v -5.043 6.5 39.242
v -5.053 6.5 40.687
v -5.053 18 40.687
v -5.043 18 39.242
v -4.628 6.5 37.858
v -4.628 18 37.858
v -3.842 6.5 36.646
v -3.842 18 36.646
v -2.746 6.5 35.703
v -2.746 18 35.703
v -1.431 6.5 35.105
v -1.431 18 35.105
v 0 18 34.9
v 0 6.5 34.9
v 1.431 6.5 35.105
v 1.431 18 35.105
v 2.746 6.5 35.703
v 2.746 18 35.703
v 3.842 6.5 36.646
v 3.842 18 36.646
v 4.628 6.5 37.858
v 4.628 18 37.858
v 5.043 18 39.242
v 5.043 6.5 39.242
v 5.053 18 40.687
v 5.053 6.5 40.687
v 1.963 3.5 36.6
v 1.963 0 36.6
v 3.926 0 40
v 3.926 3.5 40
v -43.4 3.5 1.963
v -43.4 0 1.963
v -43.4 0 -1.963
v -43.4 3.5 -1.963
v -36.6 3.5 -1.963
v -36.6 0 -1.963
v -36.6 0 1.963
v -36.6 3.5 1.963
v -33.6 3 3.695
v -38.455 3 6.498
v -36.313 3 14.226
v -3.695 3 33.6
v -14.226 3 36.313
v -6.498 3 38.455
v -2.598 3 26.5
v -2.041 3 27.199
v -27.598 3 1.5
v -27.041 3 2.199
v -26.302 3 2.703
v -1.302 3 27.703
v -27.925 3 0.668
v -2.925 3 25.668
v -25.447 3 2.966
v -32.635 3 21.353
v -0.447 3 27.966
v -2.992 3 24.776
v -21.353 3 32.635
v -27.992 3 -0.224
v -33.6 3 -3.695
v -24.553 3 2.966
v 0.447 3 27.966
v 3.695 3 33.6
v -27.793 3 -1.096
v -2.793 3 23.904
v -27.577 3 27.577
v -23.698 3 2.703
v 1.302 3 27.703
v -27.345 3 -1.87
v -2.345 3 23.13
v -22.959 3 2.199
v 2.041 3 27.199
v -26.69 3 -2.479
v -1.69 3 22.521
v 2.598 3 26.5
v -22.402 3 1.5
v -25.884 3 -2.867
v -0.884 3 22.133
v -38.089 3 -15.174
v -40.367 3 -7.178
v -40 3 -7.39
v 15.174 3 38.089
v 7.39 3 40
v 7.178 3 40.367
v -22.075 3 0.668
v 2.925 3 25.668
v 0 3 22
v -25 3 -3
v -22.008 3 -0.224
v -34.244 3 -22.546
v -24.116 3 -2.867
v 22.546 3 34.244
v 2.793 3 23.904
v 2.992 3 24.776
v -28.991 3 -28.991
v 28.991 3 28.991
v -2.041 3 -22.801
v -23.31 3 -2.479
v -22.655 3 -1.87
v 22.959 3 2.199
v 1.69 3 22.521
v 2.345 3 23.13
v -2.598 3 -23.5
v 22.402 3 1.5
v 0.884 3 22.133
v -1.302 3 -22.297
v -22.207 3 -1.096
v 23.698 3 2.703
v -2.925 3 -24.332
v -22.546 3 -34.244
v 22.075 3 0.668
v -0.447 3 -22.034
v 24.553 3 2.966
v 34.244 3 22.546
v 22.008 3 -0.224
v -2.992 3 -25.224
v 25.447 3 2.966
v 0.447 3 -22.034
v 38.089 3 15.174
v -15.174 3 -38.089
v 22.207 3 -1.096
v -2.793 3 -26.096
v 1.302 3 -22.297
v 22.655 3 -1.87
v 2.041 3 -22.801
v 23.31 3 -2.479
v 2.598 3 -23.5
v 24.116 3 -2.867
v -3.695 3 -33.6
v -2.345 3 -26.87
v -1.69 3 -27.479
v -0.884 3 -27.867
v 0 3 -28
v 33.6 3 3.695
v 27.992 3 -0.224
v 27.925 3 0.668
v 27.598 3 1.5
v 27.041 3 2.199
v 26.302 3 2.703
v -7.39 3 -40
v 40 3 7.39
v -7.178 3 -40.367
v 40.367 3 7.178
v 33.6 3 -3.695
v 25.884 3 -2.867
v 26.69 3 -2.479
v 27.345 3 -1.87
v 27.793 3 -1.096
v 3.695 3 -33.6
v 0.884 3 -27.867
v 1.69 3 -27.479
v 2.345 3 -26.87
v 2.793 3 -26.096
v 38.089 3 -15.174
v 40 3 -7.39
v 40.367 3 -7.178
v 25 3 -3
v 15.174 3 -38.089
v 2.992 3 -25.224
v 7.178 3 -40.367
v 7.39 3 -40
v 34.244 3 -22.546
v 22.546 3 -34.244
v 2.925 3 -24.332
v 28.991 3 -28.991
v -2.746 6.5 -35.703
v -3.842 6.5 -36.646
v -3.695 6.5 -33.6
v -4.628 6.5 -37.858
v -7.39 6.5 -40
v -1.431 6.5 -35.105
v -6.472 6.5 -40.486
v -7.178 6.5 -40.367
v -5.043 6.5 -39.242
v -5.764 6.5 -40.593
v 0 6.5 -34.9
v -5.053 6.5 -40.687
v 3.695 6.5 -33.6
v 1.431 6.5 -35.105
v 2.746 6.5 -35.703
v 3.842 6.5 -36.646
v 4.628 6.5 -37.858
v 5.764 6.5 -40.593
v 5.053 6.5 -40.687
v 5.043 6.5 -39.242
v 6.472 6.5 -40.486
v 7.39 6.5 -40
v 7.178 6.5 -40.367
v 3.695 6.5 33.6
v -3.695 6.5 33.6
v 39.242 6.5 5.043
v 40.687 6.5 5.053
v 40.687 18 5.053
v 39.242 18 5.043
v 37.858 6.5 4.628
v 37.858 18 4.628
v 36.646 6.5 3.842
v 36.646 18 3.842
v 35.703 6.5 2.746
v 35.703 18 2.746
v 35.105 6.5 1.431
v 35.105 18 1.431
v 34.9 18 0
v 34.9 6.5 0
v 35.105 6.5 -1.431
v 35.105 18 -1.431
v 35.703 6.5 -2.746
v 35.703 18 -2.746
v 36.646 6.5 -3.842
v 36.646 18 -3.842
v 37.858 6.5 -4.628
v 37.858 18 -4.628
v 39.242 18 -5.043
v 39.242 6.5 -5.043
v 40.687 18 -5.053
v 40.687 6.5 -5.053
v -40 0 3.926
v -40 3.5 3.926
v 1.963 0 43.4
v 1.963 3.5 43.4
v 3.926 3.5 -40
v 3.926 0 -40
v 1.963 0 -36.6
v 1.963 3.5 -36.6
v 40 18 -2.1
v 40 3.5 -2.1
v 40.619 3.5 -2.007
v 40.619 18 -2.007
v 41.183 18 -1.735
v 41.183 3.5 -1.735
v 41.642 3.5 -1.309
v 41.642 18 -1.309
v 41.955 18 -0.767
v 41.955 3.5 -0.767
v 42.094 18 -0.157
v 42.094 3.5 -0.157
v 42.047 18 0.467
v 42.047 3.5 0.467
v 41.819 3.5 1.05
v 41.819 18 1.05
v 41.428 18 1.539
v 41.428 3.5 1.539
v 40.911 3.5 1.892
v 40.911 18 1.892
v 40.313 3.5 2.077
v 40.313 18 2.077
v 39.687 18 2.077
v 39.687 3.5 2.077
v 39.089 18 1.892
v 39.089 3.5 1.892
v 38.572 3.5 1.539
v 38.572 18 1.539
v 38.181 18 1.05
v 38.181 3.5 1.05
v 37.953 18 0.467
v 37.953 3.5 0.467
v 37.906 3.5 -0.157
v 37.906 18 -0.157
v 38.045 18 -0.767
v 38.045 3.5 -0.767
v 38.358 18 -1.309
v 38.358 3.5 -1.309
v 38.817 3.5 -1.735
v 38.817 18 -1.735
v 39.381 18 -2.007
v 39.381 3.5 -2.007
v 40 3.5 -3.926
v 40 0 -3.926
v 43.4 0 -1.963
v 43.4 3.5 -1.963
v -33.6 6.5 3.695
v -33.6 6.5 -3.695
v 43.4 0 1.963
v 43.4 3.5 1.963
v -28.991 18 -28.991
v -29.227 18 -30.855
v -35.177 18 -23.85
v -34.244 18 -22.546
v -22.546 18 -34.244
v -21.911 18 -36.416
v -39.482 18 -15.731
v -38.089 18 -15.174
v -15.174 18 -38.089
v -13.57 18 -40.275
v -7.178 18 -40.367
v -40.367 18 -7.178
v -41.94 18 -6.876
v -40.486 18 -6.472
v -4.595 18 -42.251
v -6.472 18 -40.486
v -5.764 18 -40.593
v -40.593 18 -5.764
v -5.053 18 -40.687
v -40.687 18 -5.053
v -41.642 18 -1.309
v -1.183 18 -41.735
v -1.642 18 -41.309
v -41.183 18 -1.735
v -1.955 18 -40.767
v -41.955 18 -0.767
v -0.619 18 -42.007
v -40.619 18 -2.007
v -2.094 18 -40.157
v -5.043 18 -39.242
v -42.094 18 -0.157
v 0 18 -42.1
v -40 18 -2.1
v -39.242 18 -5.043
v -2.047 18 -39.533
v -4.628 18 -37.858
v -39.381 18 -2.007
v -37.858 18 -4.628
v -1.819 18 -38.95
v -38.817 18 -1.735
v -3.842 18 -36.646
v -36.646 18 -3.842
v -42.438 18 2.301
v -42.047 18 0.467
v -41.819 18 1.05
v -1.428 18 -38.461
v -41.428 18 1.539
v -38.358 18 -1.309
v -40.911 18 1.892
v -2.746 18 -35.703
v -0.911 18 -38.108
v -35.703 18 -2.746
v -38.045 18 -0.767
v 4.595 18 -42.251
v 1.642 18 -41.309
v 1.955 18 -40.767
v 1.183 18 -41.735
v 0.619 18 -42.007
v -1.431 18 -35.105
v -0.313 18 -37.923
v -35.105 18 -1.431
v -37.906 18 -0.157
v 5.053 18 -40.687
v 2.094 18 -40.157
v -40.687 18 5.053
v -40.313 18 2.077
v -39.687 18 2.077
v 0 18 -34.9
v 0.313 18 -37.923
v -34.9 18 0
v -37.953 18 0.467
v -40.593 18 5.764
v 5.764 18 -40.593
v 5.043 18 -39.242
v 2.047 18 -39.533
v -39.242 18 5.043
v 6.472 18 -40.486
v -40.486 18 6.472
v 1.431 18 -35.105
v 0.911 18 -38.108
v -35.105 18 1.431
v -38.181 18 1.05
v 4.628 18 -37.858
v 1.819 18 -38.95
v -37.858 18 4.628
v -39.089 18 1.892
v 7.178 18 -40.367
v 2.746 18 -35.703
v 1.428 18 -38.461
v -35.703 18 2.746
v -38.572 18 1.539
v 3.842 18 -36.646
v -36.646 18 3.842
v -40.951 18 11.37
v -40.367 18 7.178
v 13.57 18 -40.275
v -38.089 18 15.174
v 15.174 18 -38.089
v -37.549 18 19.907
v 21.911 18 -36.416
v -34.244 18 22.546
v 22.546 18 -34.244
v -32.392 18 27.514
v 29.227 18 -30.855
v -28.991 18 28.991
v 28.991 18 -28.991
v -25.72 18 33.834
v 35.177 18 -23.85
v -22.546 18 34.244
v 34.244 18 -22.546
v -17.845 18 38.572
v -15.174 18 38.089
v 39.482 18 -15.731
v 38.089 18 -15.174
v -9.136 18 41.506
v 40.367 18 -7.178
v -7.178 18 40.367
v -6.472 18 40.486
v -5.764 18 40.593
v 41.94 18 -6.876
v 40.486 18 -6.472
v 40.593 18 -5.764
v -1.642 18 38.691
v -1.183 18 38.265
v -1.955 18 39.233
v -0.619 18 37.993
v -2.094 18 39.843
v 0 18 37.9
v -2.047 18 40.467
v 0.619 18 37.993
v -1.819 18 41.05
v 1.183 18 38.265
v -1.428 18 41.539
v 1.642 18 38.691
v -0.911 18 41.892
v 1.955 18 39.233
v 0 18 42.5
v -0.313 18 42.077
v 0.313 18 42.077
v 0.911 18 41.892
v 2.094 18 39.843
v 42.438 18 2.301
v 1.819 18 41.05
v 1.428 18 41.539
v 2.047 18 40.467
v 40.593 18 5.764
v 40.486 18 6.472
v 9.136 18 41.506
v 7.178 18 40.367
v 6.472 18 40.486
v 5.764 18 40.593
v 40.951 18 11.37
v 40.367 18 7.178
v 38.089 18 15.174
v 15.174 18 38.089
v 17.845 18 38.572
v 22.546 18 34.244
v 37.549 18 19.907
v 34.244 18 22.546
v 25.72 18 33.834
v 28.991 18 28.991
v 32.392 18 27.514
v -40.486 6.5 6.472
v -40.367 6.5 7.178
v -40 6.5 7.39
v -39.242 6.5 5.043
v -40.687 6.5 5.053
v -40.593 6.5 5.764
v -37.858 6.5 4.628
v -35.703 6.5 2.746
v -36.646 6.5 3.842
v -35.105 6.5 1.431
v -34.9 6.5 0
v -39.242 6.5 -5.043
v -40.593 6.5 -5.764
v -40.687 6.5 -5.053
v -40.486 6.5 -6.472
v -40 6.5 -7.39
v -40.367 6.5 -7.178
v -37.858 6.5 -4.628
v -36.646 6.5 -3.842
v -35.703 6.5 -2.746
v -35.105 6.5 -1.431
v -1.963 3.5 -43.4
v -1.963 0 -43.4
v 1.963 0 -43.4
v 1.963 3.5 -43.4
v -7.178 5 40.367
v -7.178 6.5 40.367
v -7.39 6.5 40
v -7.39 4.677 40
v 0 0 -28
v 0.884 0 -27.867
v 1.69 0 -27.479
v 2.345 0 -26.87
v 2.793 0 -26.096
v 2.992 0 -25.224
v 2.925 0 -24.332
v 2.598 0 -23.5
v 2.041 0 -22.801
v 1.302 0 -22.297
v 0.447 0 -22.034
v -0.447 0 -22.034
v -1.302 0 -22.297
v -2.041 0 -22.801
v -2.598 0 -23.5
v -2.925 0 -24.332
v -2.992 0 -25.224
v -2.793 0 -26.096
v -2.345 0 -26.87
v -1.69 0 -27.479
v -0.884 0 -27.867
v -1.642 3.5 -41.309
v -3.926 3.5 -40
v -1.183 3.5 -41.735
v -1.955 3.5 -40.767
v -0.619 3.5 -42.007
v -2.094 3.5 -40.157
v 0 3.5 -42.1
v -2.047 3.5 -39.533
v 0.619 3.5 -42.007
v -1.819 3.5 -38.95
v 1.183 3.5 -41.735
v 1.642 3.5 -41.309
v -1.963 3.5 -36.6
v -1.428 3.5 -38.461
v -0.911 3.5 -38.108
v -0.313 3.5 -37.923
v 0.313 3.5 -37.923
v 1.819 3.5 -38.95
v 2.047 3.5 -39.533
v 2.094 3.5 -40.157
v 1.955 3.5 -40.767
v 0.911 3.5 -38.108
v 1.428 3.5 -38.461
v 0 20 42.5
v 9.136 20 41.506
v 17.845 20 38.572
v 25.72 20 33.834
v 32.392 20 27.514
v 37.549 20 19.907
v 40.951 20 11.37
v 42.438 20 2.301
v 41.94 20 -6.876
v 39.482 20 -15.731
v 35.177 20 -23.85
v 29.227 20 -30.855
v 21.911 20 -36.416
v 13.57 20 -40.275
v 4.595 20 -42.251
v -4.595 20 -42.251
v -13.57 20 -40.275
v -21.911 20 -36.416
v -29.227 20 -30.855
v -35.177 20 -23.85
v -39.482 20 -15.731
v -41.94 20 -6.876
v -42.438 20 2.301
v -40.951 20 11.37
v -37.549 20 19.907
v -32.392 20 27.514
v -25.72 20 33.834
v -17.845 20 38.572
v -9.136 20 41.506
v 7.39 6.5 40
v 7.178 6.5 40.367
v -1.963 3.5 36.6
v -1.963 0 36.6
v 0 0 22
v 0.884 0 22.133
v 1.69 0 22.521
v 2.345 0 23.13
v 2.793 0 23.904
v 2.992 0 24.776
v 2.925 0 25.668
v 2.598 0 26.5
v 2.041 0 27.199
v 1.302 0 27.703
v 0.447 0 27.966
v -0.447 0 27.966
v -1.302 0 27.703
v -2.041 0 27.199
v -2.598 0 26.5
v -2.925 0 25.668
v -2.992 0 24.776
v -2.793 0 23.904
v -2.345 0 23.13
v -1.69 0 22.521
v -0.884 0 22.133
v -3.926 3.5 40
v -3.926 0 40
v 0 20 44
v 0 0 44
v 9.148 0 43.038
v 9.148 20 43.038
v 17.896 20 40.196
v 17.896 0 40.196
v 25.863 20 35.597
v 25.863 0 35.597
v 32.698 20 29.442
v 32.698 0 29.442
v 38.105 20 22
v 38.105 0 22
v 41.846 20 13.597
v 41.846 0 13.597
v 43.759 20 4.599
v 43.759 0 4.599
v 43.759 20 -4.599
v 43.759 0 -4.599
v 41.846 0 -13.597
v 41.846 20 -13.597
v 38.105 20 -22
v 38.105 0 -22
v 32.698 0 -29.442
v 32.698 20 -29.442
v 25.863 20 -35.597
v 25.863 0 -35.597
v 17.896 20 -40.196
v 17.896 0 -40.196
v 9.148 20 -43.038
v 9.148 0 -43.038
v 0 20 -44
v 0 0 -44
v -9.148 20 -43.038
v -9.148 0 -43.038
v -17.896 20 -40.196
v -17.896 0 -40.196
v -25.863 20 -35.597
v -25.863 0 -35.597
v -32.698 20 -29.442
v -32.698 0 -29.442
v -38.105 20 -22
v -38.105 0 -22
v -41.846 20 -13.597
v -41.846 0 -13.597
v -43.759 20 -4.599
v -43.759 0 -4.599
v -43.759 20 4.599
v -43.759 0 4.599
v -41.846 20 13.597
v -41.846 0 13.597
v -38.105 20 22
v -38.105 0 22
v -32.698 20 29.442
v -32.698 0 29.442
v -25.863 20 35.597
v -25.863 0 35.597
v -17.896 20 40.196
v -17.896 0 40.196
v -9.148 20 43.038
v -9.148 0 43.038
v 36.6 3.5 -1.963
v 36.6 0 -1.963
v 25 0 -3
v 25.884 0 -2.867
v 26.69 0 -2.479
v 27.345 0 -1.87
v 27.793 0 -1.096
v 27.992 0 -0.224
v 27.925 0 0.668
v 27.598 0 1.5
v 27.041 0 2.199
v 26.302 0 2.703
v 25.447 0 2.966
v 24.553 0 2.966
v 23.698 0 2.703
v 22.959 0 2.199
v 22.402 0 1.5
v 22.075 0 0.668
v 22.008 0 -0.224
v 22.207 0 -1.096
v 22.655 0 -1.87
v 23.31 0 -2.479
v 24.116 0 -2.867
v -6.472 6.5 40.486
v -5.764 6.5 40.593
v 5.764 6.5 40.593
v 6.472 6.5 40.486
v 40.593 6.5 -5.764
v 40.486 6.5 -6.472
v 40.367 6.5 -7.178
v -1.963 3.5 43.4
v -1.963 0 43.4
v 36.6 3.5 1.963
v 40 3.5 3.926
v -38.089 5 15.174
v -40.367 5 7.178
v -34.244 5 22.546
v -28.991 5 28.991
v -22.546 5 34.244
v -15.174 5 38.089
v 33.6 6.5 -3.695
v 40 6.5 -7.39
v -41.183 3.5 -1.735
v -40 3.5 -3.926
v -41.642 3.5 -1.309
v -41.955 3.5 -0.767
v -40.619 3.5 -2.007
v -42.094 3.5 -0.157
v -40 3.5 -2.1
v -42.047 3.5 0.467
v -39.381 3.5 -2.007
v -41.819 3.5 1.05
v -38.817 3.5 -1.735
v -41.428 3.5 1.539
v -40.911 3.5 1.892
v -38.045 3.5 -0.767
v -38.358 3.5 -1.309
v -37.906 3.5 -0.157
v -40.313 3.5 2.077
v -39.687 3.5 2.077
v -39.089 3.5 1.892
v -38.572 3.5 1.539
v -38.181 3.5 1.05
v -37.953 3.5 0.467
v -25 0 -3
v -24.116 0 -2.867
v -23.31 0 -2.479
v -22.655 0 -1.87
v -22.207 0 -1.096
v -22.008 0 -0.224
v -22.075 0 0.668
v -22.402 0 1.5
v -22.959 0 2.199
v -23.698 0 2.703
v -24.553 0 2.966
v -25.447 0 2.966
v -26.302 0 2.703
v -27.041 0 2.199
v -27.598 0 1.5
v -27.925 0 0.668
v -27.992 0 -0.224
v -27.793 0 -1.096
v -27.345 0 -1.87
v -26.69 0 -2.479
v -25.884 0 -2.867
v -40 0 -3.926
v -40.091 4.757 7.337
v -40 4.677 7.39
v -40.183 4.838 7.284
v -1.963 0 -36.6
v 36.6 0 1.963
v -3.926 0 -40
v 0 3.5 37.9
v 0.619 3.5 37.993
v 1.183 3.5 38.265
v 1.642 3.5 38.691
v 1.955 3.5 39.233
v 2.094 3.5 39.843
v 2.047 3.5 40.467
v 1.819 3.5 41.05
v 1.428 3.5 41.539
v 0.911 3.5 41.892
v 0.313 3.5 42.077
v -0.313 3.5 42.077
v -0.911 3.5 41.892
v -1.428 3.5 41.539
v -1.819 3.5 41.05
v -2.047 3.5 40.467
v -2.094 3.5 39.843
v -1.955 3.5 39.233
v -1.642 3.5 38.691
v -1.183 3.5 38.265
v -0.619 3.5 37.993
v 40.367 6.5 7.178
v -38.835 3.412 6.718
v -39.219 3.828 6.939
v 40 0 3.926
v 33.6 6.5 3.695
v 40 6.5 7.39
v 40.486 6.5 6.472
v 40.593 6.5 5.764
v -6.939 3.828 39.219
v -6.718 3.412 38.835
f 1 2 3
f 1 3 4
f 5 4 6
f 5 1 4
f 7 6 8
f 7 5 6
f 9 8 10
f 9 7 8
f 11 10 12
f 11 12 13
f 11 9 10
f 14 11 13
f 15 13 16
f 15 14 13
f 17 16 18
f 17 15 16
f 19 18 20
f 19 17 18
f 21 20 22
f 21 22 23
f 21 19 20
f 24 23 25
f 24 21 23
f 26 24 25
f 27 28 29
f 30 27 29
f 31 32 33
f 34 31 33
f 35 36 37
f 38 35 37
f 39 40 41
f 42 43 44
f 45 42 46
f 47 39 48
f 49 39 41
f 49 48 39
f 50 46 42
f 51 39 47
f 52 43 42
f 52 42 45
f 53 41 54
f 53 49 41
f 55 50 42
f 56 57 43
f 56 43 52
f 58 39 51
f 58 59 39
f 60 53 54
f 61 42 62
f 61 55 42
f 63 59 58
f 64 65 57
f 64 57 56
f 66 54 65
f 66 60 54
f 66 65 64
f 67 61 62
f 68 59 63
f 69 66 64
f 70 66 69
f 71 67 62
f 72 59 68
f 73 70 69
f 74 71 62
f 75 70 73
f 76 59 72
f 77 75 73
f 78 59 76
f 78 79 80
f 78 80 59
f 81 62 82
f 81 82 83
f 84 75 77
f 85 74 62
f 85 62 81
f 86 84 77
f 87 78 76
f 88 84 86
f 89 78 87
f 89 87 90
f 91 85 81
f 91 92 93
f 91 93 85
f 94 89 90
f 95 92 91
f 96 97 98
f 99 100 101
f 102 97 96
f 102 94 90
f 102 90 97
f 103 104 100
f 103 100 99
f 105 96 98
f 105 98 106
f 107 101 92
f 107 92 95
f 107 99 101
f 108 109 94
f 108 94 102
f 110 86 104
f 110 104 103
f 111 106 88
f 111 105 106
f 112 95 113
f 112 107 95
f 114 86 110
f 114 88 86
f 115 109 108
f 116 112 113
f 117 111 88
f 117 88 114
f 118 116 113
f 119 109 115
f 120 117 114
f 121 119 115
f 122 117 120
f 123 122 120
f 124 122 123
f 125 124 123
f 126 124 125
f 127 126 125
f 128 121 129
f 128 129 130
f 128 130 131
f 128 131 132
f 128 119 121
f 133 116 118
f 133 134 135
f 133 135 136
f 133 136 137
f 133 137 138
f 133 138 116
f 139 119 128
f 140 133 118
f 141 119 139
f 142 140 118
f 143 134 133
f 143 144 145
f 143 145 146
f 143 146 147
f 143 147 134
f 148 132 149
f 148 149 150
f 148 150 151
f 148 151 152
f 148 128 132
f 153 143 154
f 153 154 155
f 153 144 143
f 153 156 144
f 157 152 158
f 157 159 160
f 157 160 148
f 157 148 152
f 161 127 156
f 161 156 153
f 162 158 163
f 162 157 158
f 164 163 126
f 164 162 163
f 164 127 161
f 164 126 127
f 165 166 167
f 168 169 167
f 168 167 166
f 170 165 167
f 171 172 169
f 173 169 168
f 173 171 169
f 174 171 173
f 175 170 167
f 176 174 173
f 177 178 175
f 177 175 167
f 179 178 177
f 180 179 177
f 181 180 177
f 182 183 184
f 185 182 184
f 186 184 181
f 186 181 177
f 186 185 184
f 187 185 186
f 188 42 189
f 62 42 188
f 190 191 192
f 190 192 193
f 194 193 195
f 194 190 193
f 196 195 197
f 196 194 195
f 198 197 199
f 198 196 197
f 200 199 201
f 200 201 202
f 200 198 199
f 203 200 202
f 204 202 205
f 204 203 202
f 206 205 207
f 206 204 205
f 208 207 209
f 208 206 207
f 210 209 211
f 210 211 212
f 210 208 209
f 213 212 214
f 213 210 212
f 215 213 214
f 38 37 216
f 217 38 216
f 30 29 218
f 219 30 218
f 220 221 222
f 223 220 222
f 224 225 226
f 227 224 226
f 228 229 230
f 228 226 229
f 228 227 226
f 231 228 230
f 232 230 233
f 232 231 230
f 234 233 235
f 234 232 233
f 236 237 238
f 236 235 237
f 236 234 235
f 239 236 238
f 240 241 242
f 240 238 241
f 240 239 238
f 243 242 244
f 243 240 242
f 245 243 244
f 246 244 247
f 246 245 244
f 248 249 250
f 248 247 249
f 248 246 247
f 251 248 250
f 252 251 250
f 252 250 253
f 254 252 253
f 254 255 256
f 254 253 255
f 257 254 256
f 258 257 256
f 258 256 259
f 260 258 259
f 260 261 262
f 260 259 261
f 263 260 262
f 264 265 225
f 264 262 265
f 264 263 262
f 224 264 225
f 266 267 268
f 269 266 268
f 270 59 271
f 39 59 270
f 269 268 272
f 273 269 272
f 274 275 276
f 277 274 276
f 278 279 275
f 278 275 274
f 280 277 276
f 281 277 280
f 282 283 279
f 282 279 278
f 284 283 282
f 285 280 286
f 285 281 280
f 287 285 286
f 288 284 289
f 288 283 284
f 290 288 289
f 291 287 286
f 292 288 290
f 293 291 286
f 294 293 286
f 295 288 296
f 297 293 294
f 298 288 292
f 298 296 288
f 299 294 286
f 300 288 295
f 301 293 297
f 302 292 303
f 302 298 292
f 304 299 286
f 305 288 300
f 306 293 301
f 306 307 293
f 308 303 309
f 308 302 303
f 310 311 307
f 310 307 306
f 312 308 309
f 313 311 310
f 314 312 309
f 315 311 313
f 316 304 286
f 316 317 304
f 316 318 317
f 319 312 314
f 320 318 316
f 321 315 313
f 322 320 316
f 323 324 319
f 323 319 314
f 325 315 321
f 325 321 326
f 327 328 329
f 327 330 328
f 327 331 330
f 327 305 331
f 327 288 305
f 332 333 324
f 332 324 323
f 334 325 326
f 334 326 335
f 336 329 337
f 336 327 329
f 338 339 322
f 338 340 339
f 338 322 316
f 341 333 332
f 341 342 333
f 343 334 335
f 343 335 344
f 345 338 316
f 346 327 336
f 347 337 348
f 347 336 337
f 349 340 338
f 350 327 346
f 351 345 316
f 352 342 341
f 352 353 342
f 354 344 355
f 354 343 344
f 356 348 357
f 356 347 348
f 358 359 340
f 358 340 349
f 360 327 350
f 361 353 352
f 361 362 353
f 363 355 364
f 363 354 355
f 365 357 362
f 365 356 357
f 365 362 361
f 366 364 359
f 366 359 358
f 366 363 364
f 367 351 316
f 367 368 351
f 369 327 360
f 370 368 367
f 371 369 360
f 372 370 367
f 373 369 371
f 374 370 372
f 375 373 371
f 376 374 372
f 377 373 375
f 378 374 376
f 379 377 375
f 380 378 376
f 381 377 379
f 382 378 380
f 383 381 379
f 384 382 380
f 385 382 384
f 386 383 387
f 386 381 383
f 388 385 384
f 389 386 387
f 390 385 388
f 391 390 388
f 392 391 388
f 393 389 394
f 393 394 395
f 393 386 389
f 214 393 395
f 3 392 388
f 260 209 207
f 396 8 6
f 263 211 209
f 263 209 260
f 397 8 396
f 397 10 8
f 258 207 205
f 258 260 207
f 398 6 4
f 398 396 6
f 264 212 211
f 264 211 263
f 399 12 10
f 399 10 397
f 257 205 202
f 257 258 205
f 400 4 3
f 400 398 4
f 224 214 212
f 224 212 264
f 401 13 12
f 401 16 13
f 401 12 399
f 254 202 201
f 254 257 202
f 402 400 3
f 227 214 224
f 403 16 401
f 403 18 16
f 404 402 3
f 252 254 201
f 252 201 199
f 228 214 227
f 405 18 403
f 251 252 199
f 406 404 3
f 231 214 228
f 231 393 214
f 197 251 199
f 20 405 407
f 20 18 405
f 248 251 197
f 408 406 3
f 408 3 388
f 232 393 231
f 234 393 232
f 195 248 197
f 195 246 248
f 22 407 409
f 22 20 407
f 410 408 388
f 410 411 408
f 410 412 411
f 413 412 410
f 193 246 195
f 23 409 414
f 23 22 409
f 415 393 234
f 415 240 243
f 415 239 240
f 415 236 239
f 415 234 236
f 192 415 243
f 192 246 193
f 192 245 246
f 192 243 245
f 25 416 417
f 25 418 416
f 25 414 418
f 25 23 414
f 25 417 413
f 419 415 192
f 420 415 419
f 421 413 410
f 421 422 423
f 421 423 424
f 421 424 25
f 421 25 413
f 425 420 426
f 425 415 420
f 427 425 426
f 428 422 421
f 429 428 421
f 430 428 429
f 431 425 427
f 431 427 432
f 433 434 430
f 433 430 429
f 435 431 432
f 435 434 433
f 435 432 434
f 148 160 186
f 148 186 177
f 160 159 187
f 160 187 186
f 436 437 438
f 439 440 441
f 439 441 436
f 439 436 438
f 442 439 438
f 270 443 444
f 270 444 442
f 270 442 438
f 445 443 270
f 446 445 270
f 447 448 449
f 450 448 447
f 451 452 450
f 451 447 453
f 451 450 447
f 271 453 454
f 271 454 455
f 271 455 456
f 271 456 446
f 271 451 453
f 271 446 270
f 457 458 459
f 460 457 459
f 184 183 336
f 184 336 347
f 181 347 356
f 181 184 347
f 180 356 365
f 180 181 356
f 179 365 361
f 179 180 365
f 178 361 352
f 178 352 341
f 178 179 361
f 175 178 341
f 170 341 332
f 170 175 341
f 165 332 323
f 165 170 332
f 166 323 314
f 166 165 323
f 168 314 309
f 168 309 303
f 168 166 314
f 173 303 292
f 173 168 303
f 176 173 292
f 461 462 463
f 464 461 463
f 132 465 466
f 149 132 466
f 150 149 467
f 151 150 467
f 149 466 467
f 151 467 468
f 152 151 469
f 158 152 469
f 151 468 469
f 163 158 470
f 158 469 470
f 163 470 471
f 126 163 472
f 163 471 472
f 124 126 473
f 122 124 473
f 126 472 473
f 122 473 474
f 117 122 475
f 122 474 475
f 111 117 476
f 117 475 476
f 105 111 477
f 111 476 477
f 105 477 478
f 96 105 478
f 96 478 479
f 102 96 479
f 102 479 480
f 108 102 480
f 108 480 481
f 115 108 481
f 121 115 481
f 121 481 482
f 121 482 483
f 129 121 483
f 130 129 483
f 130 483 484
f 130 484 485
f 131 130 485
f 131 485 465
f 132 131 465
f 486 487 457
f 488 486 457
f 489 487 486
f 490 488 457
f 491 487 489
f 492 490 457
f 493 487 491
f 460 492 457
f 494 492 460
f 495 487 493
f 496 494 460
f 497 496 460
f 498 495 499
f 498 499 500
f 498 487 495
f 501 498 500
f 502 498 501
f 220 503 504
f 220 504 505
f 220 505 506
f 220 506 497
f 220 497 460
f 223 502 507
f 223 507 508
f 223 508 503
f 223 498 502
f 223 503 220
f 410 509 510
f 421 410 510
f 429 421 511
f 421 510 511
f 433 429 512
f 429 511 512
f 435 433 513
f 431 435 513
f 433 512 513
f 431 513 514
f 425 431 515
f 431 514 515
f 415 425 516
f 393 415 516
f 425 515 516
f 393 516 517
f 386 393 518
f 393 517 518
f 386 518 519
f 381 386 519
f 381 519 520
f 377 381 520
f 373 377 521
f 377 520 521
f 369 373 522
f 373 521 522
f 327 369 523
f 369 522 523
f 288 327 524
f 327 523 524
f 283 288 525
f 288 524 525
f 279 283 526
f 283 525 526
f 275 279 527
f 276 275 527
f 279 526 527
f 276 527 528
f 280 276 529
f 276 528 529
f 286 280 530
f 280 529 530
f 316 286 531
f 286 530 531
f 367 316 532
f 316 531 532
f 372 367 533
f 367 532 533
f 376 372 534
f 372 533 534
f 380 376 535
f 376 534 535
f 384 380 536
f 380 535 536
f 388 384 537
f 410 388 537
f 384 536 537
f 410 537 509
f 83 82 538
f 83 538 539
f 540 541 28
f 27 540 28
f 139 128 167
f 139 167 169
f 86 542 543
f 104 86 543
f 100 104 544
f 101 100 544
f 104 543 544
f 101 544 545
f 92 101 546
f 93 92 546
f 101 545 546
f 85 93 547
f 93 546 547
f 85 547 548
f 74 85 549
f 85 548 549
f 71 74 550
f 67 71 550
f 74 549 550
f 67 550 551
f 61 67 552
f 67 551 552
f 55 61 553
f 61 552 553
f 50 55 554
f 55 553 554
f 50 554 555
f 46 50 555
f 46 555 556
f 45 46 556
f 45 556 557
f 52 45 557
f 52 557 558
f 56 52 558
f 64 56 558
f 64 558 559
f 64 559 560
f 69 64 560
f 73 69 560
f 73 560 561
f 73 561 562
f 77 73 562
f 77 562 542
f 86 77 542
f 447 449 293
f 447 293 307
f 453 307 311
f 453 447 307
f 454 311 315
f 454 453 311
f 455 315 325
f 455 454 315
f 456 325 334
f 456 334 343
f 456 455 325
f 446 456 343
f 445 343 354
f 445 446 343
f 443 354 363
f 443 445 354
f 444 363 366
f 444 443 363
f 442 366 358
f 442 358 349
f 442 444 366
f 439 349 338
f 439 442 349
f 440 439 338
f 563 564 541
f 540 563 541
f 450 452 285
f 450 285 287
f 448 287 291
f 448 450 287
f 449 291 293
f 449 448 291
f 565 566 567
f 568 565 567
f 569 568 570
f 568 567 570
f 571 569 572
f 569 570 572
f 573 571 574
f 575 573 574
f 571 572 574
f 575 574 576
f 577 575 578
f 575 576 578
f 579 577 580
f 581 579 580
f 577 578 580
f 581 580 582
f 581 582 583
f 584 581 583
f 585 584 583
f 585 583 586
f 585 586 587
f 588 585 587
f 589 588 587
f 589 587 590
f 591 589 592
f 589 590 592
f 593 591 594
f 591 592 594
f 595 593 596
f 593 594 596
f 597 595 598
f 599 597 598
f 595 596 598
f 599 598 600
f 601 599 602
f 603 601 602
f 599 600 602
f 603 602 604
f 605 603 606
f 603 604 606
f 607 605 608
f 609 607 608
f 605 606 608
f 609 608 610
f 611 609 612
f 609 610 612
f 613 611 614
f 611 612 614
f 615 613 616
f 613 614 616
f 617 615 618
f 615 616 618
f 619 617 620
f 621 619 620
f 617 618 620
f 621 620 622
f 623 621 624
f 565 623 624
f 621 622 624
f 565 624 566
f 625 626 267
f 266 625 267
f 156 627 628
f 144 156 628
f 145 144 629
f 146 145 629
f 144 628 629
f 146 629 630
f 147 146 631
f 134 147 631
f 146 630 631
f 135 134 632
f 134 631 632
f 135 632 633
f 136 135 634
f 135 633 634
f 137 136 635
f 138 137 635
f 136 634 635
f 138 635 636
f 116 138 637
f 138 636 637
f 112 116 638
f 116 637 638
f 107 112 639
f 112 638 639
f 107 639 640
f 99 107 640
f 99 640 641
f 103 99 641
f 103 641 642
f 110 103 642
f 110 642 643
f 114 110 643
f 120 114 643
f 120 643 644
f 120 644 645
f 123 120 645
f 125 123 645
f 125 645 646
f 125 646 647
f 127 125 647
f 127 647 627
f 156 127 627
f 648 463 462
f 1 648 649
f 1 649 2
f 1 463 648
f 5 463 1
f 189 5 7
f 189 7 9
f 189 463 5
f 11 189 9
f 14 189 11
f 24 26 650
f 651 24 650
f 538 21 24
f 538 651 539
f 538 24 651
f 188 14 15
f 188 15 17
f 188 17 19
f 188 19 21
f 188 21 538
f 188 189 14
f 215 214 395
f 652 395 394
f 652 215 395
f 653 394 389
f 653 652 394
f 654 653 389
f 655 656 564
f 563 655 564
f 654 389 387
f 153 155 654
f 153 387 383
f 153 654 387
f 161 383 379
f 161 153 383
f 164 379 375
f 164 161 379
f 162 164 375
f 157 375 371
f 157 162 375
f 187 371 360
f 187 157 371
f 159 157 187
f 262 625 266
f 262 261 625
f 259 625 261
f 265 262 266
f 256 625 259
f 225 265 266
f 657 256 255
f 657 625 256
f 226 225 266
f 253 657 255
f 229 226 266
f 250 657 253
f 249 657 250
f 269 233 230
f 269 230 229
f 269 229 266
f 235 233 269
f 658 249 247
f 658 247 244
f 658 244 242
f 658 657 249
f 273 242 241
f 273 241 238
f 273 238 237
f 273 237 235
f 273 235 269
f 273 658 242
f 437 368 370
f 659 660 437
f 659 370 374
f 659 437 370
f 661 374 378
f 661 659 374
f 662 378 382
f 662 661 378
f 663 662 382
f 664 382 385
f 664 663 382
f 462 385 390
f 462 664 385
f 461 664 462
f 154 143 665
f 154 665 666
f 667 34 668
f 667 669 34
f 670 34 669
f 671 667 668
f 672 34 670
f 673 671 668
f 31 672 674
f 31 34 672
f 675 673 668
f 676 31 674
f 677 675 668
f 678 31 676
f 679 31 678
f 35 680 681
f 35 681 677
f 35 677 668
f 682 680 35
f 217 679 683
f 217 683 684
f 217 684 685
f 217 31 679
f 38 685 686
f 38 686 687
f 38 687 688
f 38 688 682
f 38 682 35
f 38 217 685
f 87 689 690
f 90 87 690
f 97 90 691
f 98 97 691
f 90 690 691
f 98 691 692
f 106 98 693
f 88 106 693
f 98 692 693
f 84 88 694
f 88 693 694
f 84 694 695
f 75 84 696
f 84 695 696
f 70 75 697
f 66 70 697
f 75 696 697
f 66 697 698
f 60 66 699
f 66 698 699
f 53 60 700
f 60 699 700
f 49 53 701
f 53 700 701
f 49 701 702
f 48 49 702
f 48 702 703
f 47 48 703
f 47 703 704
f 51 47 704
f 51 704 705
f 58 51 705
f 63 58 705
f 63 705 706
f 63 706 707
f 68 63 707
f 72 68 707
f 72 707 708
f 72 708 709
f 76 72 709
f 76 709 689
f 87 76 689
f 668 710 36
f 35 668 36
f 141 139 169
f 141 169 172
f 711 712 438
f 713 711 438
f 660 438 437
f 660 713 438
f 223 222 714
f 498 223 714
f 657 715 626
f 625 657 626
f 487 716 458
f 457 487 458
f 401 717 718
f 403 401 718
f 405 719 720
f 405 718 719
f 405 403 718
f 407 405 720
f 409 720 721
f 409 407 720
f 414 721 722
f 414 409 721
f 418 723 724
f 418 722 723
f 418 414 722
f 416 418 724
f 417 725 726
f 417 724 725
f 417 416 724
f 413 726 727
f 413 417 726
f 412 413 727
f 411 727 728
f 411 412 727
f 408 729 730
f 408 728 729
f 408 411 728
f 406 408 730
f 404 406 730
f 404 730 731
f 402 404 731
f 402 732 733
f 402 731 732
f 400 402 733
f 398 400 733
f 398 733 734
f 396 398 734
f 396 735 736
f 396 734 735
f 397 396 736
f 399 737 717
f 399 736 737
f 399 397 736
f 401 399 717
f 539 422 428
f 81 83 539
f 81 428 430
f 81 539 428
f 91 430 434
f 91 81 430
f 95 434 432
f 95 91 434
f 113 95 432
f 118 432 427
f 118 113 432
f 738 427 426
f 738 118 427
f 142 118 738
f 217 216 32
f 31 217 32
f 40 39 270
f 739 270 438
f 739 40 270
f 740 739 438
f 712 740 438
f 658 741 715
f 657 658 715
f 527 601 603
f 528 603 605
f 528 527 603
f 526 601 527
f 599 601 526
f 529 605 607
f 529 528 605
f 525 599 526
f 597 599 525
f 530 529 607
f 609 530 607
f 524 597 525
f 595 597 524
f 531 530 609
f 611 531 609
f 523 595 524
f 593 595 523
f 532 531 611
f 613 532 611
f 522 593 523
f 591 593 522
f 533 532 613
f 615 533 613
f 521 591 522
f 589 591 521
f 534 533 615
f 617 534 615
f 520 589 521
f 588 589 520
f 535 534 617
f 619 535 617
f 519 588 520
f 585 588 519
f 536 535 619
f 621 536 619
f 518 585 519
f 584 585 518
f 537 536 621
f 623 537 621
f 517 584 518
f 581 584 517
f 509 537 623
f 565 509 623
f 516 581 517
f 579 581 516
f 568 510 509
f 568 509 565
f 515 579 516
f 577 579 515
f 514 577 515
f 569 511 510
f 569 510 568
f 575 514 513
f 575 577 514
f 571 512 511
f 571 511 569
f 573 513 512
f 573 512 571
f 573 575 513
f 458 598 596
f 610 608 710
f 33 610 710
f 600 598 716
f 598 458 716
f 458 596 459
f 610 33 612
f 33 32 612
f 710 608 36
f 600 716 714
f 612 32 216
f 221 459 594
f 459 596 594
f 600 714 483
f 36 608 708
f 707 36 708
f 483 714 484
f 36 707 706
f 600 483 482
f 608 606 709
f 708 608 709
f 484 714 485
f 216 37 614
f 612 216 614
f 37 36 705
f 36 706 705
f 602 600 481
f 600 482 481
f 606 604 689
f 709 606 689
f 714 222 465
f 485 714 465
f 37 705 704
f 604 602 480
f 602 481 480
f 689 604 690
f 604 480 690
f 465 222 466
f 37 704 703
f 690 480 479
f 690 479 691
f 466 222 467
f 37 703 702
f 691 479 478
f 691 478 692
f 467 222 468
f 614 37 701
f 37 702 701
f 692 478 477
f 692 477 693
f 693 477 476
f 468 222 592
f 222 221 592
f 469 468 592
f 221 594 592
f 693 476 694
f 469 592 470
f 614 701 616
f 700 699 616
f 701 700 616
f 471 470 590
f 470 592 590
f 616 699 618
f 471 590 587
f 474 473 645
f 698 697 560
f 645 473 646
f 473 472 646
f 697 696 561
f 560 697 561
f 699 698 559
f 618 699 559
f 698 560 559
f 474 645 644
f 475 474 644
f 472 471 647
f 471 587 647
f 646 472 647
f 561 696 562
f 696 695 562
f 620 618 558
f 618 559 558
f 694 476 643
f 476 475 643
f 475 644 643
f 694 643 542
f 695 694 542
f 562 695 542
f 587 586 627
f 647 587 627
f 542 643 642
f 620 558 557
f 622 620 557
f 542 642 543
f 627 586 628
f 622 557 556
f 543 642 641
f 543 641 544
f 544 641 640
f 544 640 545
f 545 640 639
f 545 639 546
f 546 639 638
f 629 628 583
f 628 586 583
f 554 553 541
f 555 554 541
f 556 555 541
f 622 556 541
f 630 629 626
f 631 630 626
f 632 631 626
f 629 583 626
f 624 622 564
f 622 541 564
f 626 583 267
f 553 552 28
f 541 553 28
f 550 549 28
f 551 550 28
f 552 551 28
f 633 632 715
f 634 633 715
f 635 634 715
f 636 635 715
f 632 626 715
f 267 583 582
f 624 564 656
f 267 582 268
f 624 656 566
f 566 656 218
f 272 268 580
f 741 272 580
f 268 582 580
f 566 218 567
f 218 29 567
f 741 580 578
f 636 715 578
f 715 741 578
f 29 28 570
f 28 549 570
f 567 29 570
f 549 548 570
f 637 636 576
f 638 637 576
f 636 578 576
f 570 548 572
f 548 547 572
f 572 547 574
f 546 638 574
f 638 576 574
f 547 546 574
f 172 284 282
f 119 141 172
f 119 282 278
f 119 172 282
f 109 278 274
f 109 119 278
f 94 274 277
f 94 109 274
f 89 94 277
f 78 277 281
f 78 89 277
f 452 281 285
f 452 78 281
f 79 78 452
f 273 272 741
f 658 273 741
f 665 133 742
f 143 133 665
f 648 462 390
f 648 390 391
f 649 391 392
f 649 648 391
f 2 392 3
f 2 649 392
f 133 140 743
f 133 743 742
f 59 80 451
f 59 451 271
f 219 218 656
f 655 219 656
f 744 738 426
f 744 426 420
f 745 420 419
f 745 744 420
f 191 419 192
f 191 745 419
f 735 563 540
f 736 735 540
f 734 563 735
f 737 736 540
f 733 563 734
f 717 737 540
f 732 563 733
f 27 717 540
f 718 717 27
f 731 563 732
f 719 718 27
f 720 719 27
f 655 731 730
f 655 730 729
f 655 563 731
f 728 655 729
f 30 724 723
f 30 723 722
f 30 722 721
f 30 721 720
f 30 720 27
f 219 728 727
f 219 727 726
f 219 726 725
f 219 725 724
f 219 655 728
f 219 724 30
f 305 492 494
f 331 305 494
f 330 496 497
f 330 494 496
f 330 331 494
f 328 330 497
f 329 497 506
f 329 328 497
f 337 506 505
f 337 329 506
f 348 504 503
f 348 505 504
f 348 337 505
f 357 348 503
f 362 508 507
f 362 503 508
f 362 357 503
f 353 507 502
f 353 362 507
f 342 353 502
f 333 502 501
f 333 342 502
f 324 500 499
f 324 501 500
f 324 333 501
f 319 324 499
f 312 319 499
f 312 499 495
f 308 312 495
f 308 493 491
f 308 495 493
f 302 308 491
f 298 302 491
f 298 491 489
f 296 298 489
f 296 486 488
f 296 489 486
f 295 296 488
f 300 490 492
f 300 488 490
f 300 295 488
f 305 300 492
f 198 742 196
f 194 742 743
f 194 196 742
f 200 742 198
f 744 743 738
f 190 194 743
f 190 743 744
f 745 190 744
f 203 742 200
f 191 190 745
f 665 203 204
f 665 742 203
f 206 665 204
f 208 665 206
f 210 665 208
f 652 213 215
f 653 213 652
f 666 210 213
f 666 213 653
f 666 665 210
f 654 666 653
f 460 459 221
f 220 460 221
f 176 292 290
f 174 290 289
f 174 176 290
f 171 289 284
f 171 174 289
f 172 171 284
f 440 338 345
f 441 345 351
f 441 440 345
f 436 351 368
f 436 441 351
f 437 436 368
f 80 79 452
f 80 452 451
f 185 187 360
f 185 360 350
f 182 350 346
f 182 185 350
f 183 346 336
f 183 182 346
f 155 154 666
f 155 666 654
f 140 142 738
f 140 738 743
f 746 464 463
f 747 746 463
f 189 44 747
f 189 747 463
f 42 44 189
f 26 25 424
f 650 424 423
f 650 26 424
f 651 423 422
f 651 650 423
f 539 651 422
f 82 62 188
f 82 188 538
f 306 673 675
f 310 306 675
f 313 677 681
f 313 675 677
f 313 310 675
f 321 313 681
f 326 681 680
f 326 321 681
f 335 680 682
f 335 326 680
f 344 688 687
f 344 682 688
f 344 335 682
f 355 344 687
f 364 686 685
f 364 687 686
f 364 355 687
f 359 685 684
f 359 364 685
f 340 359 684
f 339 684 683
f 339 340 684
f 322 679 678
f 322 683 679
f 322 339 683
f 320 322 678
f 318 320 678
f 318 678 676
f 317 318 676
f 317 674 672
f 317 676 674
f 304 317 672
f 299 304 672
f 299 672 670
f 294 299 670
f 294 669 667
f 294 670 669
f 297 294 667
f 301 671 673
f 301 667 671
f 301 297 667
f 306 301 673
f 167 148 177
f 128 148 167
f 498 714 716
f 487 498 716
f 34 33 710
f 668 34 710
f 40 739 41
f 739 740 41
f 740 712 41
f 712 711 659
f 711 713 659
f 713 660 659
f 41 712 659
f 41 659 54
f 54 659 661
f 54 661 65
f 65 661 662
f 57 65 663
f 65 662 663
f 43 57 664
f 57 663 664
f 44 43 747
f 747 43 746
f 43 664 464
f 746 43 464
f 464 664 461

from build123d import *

# Parameters (mm, degrees)
CROQUIS1_R              = 44
SALIENTE_EXTRUIR1_DEPTH = 20
CROQUIS3_R              = 2.1
CORTAR_EXTRUIR3_DEPTH   = 81.199750623
CORTAR_EXTRUIR5_DEPTH   = 3.5
VACIADO1_START          = 3
VACIADO1_DEPTH          = 17
VACIADO1_START_2        = 6.5
VACIADO1_2_DEPTH        = 13.5
CROQUIS2_R              = 3
CORTAR_EXTRUIR1_DEPTH   = 66.360538553
CROQUIS4_R              = 42.5
CORTAR_EXTRUIR4_DEPTH   = 2
CHAFL_N1_SIZE           = 2


# Read off the part's stored shape, not the designer's step: Vaciado1
with BuildPart() as part:
    # Croquis1 → Saliente-Extruir1 (new body)
    with BuildSketch(Plane(origin=(0, 0, 0), x_dir=(1, 0, 0), z_dir=(0, 1, 0))):
        with Locations(Location((0, 0, 0), (0, 0, 270))):
            Circle(CROQUIS1_R)
    extrude(amount=SALIENTE_EXTRUIR1_DEPTH)

    # Croquis3 → Cortar-Extruir3 (cut, through all)
    with BuildSketch(Plane(origin=(0, 20, -20), x_dir=(1, 0, 0), z_dir=(0, -1, 0))):
        with Locations(Location((-40, 20, 0), (0, 0, 270))):
            Circle(CROQUIS3_R)
        with Locations(Location((0, 60, 0), (0, 0, 270))):
            Circle(CROQUIS3_R)
        with Locations(Location((40, 20, 0), (0, 0, 270))):
            Circle(CROQUIS3_R)
        with Locations(Location((0, -20, 0), (0, 0, 270))):
            Circle(CROQUIS3_R)
    extrude(amount=CORTAR_EXTRUIR3_DEPTH, mode=Mode.SUBTRACT)

    # Croquis5 → Cortar-Extruir5 (cut)
    with BuildSketch(Plane.XZ):
        Polygon((40, -3.92598183), (43.4, -1.962990915), (43.4, 1.962990915), (40, 3.92598183), (36.6, 1.962990915), (36.6, -1.962990915), align=None)
        Polygon((3.92598183, 40), (1.962990915, 43.4), (-1.962990915, 43.4), (-3.92598183, 40), (-1.962990915, 36.6), (1.962990915, 36.6), align=None)
        Polygon((-3.92598183, -40), (-1.962990915, -43.4), (1.962990915, -43.4), (3.92598183, -40), (1.962990915, -36.6), (-1.962990915, -36.6), align=None)
        Polygon((-40, 3.92598183), (-43.4, 1.962990915), (-43.4, -1.962990915), (-40, -3.92598183), (-36.6, -1.962990915), (-36.6, 1.962990915), align=None)
    extrude(amount=-CORTAR_EXTRUIR5_DEPTH, mode=Mode.SUBTRACT)

    # Vaciado1 outline → Vaciado1 (cut)
    with BuildSketch(Plane(origin=(0, 0, 0), x_dir=(1, 0, 0), z_dir=(0, 1, 0)).offset(VACIADO1_START)):
        with BuildLine():
            ThreePointArc((-7.178364733, 40.366707567), (-28.991378029, 28.991378029), (-40.366707567, 7.178364733))
            Line((-40.366707567, 7.178364733), (-40, 7.390083446))
            Line((-40, 7.390083446), (-33.6, 3.695041723))
            Line((-33.6, 3.695041723), (-33.6, -3.695041723))
            Line((-33.6, -3.695041723), (-40, -7.390083446))
            Line((-40, -7.390083446), (-40.366707567, -7.178364733))
            ThreePointArc((-40.366707567, -7.178364733), (-28.991378029, -28.991378029), (-7.178364733, -40.366707567))
            Line((-7.178364733, -40.366707567), (-7.390083446, -40))
            Line((-7.390083446, -40), (-3.695041723, -33.6))
            Line((-3.695041723, -33.6), (3.695041723, -33.6))
            Line((3.695041723, -33.6), (7.390083446, -40))
            Line((7.390083446, -40), (7.178364733, -40.366707567))
            ThreePointArc((7.178364733, -40.366707567), (28.991378029, -28.991378029), (40.366707567, -7.178364733))
            Line((40.366707567, -7.178364733), (40, -7.390083446))
            Line((40, -7.390083446), (33.6, -3.695041723))
            Line((33.6, -3.695041723), (33.6, 3.695041723))
            Line((33.6, 3.695041723), (40, 7.390083446))
            Line((40, 7.390083446), (40.366707567, 7.178364733))
            ThreePointArc((40.366707567, 7.178364733), (28.991378029, 28.991378029), (7.178364733, 40.366707567))
            Line((7.178364733, 40.366707567), (7.390083446, 40))
            Line((7.390083446, 40), (3.695041723, 33.6))
            Line((3.695041723, 33.6), (-3.695041723, 33.6))
            Line((-3.695041723, 33.6), (-7.390083446, 40))
            Line((-7.390083446, 40), (-7.178364733, 40.366707567))
        make_face()
    extrude(amount=VACIADO1_DEPTH, mode=Mode.SUBTRACT)

    # Vaciado1 2 outline → Vaciado1 2 (cut)
    with BuildSketch(Plane(origin=(0, 0, 0), x_dir=(1, 0, 0), z_dir=(0, 1, 0)).offset(VACIADO1_START_2)):
        with BuildLine():
            ThreePointArc((-40.366707567, 7.178364733), (-40.540965383, 6.118016497), (-40.687375, 5.053465703))
            ThreePointArc((-40.687375, 5.053465703), (-34.9, 0), (-40.687375, -5.053465703))
            ThreePointArc((-40.687375, -5.053465703), (-40.540965383, -6.118016497), (-40.366707567, -7.178364733))
            Line((-40.366707567, -7.178364733), (-40, -7.390083446))
            Line((-40, -7.390083446), (-33.6, -3.695041723))
            Line((-33.6, -3.695041723), (-33.6, 3.695041723))
            Line((-33.6, 3.695041723), (-40, 7.390083446))
            Line((-40, 7.390083446), (-40.366707567, 7.178364733))
        make_face()
        with BuildLine():
            ThreePointArc((-5.053465703, 40.687375), (-6.118016497, 40.540965383), (-7.178364733, 40.366707567))
            Line((-7.178364733, 40.366707567), (-7.390083446, 40))
            Line((-7.390083446, 40), (-3.695041723, 33.6))
            Line((-3.695041723, 33.6), (3.695041723, 33.6))
            Line((3.695041723, 33.6), (7.390083446, 40))
            Line((7.390083446, 40), (7.178364733, 40.366707567))
            ThreePointArc((7.178364733, 40.366707567), (6.118016497, 40.540965383), (5.053465703, 40.687375))
            ThreePointArc((5.053465703, 40.687375), (0, 34.9), (-5.053465703, 40.687375))
        make_face()
        with BuildLine():
            Line((-7.390083446, -40), (-7.178364733, -40.366707567))
            ThreePointArc((-7.178364733, -40.366707567), (-6.118016497, -40.540965383), (-5.053465703, -40.687375))
            ThreePointArc((-5.053465703, -40.687375), (0, -34.9), (5.053465703, -40.687375))
            ThreePointArc((5.053465703, -40.687375), (6.118016497, -40.540965383), (7.178364733, -40.366707567))
            Line((7.178364733, -40.366707567), (7.390083446, -40))
            Line((7.390083446, -40), (3.695041723, -33.6))
            Line((3.695041723, -33.6), (-3.695041723, -33.6))
            Line((-3.695041723, -33.6), (-7.390083446, -40))
        make_face()
        with BuildLine():
            ThreePointArc((40.687375, 5.053465703), (40.540965383, 6.118016497), (40.366707567, 7.178364733))
            Line((40.366707567, 7.178364733), (40, 7.390083446))
            Line((40, 7.390083446), (33.6, 3.695041723))
            Line((33.6, 3.695041723), (33.6, -3.695041723))
            Line((33.6, -3.695041723), (40, -7.390083446))
            Line((40, -7.390083446), (40.366707567, -7.178364733))
            ThreePointArc((40.366707567, -7.178364733), (40.540965383, -6.118016497), (40.687375, -5.053465703))
            ThreePointArc((40.687375, -5.053465703), (34.9, 0), (40.687375, 5.053465703))
        make_face()
    extrude(amount=VACIADO1_2_DEPTH, mode=Mode.SUBTRACT)

    # Croquis2 → Cortar-Extruir1 (cut, through all)
    with BuildSketch(Plane.XZ):
        with Locations(Location((0, 25, 0), (0, 0, 270))):
            Circle(CROQUIS2_R)
        with Locations(Location((25, 0, 0), (0, 0, 270))):
            Circle(CROQUIS2_R)
        with Locations(Location((0, -25, 0), (0, 0, 270))):
            Circle(CROQUIS2_R)
        with Locations(Location((-25, 0, 0), (0, 0, 270))):
            Circle(CROQUIS2_R)
    extrude(amount=-CORTAR_EXTRUIR1_DEPTH, mode=Mode.SUBTRACT)

    # Croquis4 → Cortar-Extruir4 (cut)
    with BuildSketch(Plane(origin=(0, 20, 0), x_dir=(1, 0, 0), z_dir=(0, 1, 0))):
        with Locations(Location((0, 0, 0), (0, 0, 270))):
            Circle(CROQUIS4_R)
    extrude(amount=-CORTAR_EXTRUIR4_DEPTH, mode=Mode.SUBTRACT)

    # Chaflán1
    chafl_n1_edges = [part.edges().sort_by_distance(p)[0] for p in [
        (-28.991378029, 3, 28.991378029),
    ]]
    chamfer(chafl_n1_edges, length=CHAFL_N1_SIZE)


solid = part.part
